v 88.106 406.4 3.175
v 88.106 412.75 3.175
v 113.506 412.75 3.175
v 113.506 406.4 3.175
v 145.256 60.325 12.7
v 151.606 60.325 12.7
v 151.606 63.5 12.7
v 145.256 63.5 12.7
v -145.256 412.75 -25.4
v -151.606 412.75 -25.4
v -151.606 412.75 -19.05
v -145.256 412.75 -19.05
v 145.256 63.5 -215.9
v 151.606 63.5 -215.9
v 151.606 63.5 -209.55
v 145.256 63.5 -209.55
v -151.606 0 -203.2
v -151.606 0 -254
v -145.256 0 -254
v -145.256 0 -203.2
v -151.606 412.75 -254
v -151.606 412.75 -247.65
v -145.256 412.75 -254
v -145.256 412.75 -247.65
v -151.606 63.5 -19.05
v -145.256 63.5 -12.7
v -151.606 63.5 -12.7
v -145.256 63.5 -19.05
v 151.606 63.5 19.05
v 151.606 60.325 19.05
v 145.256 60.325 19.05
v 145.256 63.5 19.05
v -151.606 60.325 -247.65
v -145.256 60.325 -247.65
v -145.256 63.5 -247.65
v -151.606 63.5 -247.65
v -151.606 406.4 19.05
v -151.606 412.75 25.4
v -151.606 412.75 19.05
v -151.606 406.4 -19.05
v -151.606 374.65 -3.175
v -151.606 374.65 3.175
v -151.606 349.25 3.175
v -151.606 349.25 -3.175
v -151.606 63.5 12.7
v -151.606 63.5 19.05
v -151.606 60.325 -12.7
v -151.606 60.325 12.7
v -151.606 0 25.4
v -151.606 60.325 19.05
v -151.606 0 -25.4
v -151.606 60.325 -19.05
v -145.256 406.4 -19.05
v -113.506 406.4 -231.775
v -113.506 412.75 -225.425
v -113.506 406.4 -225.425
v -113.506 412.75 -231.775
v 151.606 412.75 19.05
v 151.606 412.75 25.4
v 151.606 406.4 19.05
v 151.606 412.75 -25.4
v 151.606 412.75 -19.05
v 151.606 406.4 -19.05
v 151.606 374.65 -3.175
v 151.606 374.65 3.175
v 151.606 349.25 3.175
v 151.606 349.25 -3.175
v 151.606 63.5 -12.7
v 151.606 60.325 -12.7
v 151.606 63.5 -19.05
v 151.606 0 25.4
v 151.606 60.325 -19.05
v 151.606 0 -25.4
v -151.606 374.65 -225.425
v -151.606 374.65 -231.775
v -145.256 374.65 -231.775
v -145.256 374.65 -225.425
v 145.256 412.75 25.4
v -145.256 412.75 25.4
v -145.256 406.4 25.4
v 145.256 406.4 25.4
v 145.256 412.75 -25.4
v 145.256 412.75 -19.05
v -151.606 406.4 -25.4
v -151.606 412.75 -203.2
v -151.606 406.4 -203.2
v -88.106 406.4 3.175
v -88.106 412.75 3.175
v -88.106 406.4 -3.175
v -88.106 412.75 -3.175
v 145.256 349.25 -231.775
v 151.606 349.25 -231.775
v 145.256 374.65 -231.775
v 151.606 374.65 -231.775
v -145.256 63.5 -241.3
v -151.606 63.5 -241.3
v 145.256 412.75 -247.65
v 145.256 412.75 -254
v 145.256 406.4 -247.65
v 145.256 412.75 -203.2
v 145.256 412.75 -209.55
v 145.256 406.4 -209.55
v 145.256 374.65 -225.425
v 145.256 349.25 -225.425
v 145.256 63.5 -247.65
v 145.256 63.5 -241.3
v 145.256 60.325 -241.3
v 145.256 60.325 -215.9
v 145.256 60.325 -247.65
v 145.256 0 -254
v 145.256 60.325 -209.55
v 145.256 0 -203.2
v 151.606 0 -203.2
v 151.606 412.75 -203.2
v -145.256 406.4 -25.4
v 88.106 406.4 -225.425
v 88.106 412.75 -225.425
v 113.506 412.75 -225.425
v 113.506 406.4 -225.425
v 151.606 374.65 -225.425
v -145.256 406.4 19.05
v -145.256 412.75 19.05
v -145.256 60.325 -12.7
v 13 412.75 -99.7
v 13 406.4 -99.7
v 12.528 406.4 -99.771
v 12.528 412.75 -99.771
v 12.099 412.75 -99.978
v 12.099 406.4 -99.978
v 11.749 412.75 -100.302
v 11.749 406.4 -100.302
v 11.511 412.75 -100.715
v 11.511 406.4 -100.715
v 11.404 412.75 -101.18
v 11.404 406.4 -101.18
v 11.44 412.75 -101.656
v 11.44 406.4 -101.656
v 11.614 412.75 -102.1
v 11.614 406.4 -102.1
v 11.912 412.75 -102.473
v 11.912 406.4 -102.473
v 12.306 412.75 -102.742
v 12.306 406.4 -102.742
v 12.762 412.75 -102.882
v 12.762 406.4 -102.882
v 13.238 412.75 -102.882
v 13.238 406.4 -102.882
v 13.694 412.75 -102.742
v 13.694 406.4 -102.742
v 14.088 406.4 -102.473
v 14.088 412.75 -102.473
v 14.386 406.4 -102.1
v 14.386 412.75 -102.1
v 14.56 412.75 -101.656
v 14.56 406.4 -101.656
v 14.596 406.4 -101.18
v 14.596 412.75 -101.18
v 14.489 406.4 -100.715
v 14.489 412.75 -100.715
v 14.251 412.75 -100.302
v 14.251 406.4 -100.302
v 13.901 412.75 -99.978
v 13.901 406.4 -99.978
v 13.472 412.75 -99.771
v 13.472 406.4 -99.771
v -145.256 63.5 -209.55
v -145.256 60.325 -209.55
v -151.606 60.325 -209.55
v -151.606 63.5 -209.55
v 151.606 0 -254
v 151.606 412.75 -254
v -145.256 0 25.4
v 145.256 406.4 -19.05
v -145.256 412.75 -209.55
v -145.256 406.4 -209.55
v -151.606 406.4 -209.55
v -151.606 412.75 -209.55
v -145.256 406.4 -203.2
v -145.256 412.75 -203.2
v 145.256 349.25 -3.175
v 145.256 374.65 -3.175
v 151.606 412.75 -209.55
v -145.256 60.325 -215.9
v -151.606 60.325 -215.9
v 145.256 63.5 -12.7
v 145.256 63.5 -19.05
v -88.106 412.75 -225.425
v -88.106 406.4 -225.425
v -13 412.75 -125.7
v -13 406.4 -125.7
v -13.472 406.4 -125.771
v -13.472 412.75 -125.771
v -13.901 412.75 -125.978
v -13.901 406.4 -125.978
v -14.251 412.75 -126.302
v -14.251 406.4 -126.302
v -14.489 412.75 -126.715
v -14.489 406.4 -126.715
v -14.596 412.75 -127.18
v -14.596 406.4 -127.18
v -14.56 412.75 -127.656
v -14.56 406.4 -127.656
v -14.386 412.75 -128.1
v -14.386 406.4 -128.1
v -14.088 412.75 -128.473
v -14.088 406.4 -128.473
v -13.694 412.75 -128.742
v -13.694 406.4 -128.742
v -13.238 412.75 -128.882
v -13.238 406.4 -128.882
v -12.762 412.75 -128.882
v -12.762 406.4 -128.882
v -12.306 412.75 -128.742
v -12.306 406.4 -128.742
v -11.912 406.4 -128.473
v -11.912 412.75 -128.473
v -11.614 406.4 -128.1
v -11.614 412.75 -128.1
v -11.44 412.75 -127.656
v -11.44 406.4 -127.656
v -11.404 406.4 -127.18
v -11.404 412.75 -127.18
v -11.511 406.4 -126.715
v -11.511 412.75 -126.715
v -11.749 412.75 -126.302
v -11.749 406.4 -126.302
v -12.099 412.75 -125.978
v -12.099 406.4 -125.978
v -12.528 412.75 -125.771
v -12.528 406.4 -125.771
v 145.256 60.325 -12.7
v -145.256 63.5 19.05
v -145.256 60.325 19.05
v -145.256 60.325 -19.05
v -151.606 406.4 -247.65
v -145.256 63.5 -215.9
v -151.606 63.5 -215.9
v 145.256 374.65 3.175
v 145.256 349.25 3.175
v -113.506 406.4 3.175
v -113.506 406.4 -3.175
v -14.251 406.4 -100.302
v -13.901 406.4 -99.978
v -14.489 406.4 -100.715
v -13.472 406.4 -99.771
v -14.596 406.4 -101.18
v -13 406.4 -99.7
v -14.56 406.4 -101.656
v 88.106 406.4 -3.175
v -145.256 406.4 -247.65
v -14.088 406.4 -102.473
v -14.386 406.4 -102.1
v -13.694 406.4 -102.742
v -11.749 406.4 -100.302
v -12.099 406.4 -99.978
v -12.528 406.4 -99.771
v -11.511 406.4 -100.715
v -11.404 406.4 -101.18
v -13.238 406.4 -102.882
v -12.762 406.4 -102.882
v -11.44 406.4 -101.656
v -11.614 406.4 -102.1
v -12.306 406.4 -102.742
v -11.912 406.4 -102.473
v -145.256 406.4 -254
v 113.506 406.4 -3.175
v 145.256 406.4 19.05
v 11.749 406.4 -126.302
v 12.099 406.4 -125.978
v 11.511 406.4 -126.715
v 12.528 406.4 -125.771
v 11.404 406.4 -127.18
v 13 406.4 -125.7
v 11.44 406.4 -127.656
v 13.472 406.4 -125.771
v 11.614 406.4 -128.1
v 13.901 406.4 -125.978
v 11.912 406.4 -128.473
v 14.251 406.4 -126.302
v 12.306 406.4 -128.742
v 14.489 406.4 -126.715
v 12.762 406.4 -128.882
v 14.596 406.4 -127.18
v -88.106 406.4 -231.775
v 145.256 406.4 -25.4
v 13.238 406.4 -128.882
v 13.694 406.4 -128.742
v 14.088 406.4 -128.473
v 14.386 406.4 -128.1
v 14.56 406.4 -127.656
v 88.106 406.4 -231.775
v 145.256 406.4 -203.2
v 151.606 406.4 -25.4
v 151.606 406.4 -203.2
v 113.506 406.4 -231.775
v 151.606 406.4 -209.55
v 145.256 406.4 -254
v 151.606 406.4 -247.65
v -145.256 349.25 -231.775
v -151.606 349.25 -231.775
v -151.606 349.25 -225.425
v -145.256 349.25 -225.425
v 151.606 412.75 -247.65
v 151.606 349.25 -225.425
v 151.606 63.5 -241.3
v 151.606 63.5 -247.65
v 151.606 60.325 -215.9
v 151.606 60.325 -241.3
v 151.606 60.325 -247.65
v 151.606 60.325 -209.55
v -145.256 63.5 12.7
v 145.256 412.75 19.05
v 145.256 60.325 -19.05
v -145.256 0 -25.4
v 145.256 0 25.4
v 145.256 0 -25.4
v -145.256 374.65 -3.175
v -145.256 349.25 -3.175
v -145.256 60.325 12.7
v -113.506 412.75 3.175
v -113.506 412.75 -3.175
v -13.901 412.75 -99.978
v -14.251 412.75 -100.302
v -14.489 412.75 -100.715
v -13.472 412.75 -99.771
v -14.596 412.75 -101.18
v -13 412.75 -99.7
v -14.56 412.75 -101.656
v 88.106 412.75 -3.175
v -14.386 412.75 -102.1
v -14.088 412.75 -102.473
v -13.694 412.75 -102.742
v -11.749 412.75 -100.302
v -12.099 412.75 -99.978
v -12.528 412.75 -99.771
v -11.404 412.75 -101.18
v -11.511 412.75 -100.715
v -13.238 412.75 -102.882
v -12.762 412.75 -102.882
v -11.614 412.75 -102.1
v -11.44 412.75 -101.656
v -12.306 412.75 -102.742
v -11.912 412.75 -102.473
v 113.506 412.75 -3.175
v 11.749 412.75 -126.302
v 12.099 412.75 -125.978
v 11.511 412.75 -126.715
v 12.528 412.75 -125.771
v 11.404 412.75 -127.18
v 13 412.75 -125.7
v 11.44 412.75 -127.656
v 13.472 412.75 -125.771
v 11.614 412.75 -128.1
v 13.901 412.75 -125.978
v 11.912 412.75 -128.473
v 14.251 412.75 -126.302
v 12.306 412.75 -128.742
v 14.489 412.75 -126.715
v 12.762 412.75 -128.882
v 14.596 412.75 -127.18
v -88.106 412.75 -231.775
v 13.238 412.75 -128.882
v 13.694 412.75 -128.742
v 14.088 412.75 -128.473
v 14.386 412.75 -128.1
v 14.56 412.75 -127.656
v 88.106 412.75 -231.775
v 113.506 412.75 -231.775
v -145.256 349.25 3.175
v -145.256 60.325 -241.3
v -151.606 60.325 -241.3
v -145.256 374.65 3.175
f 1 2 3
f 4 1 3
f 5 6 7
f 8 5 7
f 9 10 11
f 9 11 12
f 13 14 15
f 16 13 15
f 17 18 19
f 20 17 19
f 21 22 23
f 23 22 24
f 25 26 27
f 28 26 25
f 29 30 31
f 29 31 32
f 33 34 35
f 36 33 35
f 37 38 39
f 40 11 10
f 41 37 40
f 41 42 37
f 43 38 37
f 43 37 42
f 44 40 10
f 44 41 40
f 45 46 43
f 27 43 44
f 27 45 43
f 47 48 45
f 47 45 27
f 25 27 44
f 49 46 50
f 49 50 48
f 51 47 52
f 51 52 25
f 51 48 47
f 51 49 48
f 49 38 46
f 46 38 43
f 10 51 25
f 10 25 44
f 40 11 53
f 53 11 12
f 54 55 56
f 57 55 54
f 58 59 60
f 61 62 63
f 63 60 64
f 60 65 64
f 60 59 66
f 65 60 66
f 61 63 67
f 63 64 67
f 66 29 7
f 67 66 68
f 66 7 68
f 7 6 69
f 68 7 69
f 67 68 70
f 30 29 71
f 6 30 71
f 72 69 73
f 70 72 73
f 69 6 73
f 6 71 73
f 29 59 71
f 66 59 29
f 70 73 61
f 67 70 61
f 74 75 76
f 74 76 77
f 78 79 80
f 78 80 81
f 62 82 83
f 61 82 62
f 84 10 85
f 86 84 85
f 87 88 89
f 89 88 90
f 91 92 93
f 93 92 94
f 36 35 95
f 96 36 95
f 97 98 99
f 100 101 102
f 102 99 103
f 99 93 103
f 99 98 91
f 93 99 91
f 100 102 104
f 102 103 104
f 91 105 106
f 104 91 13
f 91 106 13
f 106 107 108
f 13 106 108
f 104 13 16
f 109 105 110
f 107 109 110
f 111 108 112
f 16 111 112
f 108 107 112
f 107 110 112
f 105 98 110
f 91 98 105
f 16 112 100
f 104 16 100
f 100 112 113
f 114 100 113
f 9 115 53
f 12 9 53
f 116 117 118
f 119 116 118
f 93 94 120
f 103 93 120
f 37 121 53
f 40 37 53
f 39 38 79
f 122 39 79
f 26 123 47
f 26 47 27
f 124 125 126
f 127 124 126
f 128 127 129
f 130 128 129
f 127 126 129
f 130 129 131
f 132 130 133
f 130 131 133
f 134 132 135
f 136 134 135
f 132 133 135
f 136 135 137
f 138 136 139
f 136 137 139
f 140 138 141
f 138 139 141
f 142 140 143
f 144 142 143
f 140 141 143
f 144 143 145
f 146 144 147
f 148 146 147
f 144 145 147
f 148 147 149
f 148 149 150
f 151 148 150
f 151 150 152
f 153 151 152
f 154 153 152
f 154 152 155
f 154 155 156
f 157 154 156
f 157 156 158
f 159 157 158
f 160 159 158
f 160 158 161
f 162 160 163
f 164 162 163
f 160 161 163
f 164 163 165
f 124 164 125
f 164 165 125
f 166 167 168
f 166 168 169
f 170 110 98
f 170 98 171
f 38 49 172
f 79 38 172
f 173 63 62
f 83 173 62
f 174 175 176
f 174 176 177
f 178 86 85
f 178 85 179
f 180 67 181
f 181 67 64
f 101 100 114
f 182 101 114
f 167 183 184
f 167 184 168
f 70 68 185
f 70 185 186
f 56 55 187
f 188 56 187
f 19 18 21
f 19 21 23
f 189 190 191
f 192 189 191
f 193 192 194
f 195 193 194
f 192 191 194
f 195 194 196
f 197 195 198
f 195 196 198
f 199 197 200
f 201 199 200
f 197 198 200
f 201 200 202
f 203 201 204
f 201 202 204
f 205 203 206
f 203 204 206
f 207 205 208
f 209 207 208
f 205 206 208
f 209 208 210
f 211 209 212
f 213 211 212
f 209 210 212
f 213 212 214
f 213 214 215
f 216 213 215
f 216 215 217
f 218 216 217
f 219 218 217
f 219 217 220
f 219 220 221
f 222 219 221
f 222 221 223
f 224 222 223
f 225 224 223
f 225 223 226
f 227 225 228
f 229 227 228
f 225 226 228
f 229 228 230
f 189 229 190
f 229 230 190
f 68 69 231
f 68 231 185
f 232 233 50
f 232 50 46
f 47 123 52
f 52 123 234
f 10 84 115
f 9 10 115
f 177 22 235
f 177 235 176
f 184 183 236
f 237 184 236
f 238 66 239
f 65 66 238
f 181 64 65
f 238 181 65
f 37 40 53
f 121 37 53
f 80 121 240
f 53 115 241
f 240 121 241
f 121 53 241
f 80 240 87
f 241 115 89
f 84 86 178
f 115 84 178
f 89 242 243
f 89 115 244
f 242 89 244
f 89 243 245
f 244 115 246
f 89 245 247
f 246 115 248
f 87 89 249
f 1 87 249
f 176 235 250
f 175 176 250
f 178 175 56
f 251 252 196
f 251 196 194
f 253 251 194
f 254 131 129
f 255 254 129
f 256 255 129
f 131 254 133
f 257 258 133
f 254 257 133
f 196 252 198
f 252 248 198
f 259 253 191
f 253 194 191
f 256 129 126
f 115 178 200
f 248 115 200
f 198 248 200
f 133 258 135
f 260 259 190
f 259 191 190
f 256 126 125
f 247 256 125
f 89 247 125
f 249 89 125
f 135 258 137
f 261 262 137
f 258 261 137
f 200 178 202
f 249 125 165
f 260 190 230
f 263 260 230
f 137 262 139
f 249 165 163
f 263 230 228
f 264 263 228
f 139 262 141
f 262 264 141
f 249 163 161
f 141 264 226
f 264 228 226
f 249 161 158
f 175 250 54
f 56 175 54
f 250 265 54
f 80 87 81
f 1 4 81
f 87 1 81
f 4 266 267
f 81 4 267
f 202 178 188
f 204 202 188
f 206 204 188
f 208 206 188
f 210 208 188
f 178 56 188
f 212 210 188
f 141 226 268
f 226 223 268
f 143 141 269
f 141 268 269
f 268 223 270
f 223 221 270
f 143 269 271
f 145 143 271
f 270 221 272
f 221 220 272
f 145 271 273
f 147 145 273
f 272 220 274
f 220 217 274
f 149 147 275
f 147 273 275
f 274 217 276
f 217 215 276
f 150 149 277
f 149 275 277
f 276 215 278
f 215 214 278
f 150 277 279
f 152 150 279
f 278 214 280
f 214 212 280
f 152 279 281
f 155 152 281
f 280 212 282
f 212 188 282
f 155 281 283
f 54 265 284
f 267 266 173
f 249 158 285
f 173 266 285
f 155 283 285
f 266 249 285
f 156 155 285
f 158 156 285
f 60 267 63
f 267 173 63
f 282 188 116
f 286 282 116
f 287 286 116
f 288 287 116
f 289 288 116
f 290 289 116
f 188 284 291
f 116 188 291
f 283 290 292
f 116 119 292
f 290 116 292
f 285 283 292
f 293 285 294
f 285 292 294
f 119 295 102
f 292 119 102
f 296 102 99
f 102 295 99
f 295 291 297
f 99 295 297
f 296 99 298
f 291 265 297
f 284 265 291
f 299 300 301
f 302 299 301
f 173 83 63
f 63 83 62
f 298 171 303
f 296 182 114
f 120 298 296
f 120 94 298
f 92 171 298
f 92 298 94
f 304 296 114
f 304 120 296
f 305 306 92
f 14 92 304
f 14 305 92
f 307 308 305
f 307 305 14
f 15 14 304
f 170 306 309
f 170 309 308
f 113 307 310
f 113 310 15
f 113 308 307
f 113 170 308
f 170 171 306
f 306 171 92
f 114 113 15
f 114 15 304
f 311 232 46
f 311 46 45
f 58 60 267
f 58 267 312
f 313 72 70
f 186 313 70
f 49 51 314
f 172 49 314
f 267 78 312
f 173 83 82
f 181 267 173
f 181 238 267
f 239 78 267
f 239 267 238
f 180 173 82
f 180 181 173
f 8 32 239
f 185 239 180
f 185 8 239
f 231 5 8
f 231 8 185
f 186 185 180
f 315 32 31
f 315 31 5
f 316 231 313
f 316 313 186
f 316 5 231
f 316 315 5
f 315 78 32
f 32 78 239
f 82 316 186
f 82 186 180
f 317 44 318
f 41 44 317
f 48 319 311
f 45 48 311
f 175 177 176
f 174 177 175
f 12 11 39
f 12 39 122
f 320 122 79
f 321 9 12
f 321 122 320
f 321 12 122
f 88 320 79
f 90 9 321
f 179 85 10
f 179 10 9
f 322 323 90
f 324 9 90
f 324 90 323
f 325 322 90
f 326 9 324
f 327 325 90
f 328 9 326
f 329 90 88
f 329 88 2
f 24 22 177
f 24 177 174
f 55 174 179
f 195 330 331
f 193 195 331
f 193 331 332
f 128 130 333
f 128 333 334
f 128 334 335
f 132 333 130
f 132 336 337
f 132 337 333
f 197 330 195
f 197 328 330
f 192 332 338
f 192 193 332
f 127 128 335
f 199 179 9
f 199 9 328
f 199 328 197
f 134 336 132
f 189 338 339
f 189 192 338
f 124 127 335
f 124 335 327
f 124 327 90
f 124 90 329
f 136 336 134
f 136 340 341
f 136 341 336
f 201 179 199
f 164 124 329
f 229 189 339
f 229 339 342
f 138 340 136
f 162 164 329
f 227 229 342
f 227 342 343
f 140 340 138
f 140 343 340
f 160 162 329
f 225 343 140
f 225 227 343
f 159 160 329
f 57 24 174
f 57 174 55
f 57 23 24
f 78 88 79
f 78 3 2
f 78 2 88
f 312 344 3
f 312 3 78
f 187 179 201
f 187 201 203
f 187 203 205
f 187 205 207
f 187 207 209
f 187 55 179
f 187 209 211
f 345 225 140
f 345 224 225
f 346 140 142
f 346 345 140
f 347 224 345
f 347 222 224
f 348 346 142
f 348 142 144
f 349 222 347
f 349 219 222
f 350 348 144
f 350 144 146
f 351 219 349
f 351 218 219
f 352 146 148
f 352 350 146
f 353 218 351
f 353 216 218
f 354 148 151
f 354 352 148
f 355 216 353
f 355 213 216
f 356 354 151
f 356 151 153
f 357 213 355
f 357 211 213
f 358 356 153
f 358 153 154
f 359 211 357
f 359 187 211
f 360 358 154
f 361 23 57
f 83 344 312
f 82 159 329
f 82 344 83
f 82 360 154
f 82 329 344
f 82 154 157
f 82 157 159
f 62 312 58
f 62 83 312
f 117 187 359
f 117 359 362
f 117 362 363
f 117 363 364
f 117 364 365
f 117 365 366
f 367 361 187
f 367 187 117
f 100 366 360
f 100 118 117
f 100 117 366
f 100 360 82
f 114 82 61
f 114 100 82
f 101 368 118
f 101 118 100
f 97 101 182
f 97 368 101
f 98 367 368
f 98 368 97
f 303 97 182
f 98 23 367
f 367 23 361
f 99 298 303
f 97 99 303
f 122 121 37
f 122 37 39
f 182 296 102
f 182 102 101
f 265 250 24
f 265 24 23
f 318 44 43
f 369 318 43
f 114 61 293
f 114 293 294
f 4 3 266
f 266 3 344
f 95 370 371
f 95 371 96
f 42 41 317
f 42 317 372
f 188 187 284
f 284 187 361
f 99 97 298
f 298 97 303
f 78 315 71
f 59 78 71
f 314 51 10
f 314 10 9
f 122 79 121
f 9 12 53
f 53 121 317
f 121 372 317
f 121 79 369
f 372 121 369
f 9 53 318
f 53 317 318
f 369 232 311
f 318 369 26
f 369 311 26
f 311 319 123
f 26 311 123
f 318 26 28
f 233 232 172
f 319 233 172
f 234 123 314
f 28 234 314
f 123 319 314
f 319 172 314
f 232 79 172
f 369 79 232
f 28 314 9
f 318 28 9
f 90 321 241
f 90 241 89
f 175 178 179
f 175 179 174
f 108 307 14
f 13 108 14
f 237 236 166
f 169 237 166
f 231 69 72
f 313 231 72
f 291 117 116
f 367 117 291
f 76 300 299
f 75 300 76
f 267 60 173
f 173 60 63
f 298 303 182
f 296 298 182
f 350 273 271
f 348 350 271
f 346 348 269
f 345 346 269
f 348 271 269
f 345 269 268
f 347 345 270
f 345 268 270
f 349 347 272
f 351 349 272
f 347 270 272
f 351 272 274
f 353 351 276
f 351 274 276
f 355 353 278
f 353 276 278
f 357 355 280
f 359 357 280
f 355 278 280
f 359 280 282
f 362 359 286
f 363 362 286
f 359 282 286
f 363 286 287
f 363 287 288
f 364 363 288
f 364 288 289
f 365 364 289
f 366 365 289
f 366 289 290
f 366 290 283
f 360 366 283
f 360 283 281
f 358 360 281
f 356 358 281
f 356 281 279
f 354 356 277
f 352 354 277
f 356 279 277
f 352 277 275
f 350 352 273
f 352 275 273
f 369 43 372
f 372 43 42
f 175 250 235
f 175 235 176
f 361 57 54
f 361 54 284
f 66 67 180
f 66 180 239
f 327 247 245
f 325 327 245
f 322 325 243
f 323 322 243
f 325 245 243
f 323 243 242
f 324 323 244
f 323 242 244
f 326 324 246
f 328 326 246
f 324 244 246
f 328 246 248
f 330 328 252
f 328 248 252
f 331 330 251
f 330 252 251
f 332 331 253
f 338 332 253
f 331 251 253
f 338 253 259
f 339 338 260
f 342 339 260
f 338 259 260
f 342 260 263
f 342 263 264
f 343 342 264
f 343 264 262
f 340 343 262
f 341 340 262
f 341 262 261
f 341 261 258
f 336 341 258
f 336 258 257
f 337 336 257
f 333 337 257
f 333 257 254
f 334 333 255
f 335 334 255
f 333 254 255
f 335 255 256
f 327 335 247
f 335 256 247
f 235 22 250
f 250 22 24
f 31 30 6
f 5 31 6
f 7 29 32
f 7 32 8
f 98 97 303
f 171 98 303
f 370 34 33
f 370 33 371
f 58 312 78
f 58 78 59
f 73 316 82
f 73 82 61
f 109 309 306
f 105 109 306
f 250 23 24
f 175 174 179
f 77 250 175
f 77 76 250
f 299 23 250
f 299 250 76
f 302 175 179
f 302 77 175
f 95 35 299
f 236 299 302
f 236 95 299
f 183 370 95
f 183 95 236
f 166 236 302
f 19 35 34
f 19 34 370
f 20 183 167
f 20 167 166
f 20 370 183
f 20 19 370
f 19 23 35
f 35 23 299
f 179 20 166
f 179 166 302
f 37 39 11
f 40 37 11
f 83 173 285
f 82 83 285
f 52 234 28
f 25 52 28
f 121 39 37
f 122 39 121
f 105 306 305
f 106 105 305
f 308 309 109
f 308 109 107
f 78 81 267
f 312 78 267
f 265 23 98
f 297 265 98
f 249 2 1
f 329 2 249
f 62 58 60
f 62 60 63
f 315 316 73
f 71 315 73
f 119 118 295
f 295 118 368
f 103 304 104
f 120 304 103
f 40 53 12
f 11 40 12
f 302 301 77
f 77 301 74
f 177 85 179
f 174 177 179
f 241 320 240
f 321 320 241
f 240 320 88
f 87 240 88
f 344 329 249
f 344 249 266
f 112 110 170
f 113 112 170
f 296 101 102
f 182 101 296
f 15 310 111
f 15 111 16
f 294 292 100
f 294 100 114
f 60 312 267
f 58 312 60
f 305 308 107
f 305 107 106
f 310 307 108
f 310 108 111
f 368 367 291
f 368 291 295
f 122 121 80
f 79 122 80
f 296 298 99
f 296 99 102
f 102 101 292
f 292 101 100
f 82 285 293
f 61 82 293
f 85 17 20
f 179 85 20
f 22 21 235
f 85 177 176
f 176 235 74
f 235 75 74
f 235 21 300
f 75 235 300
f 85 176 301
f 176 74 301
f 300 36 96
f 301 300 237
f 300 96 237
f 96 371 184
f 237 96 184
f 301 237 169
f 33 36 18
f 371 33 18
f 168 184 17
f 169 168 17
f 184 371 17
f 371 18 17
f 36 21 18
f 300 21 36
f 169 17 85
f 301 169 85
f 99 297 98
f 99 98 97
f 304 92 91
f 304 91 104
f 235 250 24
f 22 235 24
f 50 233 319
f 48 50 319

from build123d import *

# Parameters (mm, degrees)
SKETCH1_W                     = 6.35
SKETCH1_H                     = 50.8
BOSS_EXTRUDE1_DEPTH           = 412.75
BOSS_EXTRUDE1_2_DEPTH         = 412.75
SKETCH3_W                     = 38.1
SKETCH3_H                     = 6.35
SKETCH3_W_2                   = 6.35
SKETCH3_H_2                   = 3.175
CUT_EXTRUDE1_DEPTH            = 513.782159066
SKETCH4_W                     = 6.35
SKETCH4_H                     = 38.1
BOSS_EXTRUDE2_DEPTH           = 6.35
SKETCH8_W                     = 303.2125
SKETCH8_H                     = 177.8
BOSS_EXTRUDE5_DEPTH           = 6.35
SKETCH11_W                    = 1.6
SKETCH11_H                    = 412.75
M3_CLEARANCE_HOLE1_AT_2_COUNT = 2
M3_CLEARANCE_HOLE1_AT_2_PITCH = 26
M3_CLEARANCE_HOLE1_AT_3_COUNT = 2
M3_CLEARANCE_HOLE1_AT_3_PITCH = 36.769552622
M3_CLEARANCE_HOLE1_AT_4_COUNT = 2
M3_CLEARANCE_HOLE1_AT_4_PITCH = 26
SKETCH12_W                    = 25.4
SKETCH12_H                    = 6.35
CUT_EXTRUDE2_DEPTH            = 6.35
SKETCH13_W                    = 6.35
SKETCH13_H                    = 25.4
CUT_EXTRUDE3_DEPTH            = 6.35


with BuildPart() as part:
    # Sketch1 → Boss-Extrude1 (new body)
    with BuildSketch(Plane(origin=(0, 0, 0), x_dir=(1, 0, 0), z_dir=(0, 1, 0))):
        with Locations((-148.43125, 0)):
            Rectangle(SKETCH1_W, SKETCH1_H)
    extrude(amount=BOSS_EXTRUDE1_DEPTH)


with BuildPart() as body_2:
    # Sketch1 → Boss-Extrude1 2 (new body)
    with BuildSketch(Plane(origin=(0, 0, 0), x_dir=(1, 0, 0), z_dir=(0, 1, 0))):
        with Locations((148.43125, 0)):
            Rectangle(SKETCH1_W, SKETCH1_H)
    extrude(amount=BOSS_EXTRUDE1_2_DEPTH)


with BuildPart() as cut_extrude1_tool:
    # Sketch3 → Cut-Extrude1 (new, through all)
    with BuildSketch(Plane(origin=(151.60625, 0, 0), x_dir=(0, 0, -1), z_dir=(1, 0, 0))):
        with Locations((0, 409.575)):
            Rectangle(SKETCH3_W, SKETCH3_H)
        with Locations((15.875, 61.9125)):
            Rectangle(SKETCH3_W_2, SKETCH3_H_2)
        with Locations((-15.875, 61.9125)):
            Rectangle(SKETCH3_W_2, SKETCH3_H_2)
    extrude(amount=-CUT_EXTRUDE1_DEPTH)


with BuildPart() as part_1:
    add(part.part)

    # Cut-Extrude1: cut by cut_extrude1_tool
    add(cut_extrude1_tool.part, mode=Mode.SUBTRACT)


with BuildPart() as body_2_1:
    add(body_2.part)

    # Cut-Extrude1: cut by cut_extrude1_tool
    add(cut_extrude1_tool.part, mode=Mode.SUBTRACT)


with BuildPart() as body_3:
    # Sketch4 → Boss-Extrude2 (new body)
    with BuildSketch(Plane(origin=(0, 412.75, 0), x_dir=(1, 0, 0), z_dir=(0, 1, 0))):
        with Locations((-148.43125, 0)):
            Rectangle(SKETCH4_W, SKETCH4_H)
        Polygon((-145.25625, 25.4), (-145.25625, 19.05), (-145.25625, -19.05), (-145.25625, -25.4), (145.25625, -25.4), (145.25625, -19.05), (145.25625, 19.05), (145.25625, 25.4), align=None)
        with Locations((148.43125, 0)):
            Rectangle(SKETCH4_W, SKETCH4_H)
    extrude(amount=-BOSS_EXTRUDE2_DEPTH)


with BuildPart() as body_4:
    # Mirror6: mirrored copy
    add(body_3.part.mirror(Plane(origin=(0, 0, -114.3), x_dir=(1, 0, 0), z_dir=(0, 0, -1))))


    add(body_3.part)  # Boss-Extrude5 merges body 3
    # Sketch8 → Boss-Extrude5 (add)
    with BuildSketch(Plane(origin=(0, 412.75, 0), x_dir=(1, 0, 0), z_dir=(0, 1, 0))):
        with Locations((0, 114.3)):
            Rectangle(SKETCH8_W, SKETCH8_H)
    extrude(amount=-BOSS_EXTRUDE5_DEPTH)

    # Sketch11 → M3 Clearance Hole1 (revolve, cut)
    with BuildSketch(Plane(origin=(-13, 412.75, -101.3), x_dir=(0, 0, 1), z_dir=(1, 0, 0))):
        with Locations((0.8, 206.375)):
            Rectangle(SKETCH11_W, SKETCH11_H)
    m3_clearance_hole1 = revolve(axis=Axis((-13, 419.1, -101.3), (0, -1, 0)), mode=Mode.SUBTRACT)

    # M3 Clearance Hole1 at 2: M3 Clearance Hole1 ×2
    with Locations(*[(0, 0, -i * M3_CLEARANCE_HOLE1_AT_2_PITCH) for i in range(1, M3_CLEARANCE_HOLE1_AT_2_COUNT)]):
        add(m3_clearance_hole1, mode=Mode.SUBTRACT)

    # M3 Clearance Hole1 at 3: M3 Clearance Hole1 ×2
    with Locations(*[Vector(0.7071067811865476, 0, -0.7071067811865476) * (i * M3_CLEARANCE_HOLE1_AT_3_PITCH) for i in range(1, M3_CLEARANCE_HOLE1_AT_3_COUNT)]):
        add(m3_clearance_hole1, mode=Mode.SUBTRACT)

    # M3 Clearance Hole1 at 4: M3 Clearance Hole1 ×2
    with Locations(*[(i * M3_CLEARANCE_HOLE1_AT_4_PITCH, 0, 0) for i in range(1, M3_CLEARANCE_HOLE1_AT_4_COUNT)]):
        add(m3_clearance_hole1, mode=Mode.SUBTRACT)

    # Sketch12 → Cut-Extrude2 (cut)
    with BuildSketch(Plane(origin=(0, 412.75, 0), x_dir=(1, 0, 0), z_dir=(0, 1, 0))):
        with Locations((-100.80625, 0)):
            Rectangle(SKETCH12_W, SKETCH12_H)
        with Locations((100.80625, 0)):
            Rectangle(SKETCH12_W, SKETCH12_H)
        with Locations((100.80625, 228.6)):
            Rectangle(SKETCH12_W, SKETCH12_H)
        with Locations((-100.80625, 228.6)):
            Rectangle(SKETCH12_W, SKETCH12_H)
    extrude(amount=-CUT_EXTRUDE2_DEPTH, mode=Mode.SUBTRACT)


with BuildPart() as body_5:
    # Mirror6 2: mirrored copy
    add(body_2_1.part.mirror(Plane(origin=(0, 0, -114.3), x_dir=(1, 0, 0), z_dir=(0, 0, -1))))


with BuildPart() as body_6:
    # Mirror6 3: mirrored copy
    add(part_1.part.mirror(Plane(origin=(0, 0, -114.3), x_dir=(1, 0, 0), z_dir=(0, 0, -1))))


with BuildPart() as cut_extrude3_tool:
    # Sketch13 → Cut-Extrude3 (new body)
    with BuildSketch(Plane.ZY.offset(151.60625)):
        with Locations((-228.6, 361.95)):
            Rectangle(SKETCH13_W, SKETCH13_H)
        with Locations((0, 361.95)):
            Rectangle(SKETCH13_W, SKETCH13_H)
    cut_extrude3 = extrude(amount=-CUT_EXTRUDE3_DEPTH)


with BuildPart() as part_2:
    add(part_1.part)

    # Cut-Extrude3: cut by cut_extrude3_tool
    add(cut_extrude3_tool.part, mode=Mode.SUBTRACT)


with BuildPart() as body_6_1:
    add(body_6.part)

    # Cut-Extrude3: cut by cut_extrude3_tool
    add(cut_extrude3_tool.part, mode=Mode.SUBTRACT)


with BuildPart() as mirror7_tool:
    # Mirror7: Cut-Extrude3 across plane
    add(cut_extrude3.mirror(Plane(origin=(0, 0, 0), x_dir=(0, 0, 1), z_dir=(1, 0, 0))))


with BuildPart() as body_2_2:
    add(body_2_1.part)

    # Mirror7: cut by mirror7_tool
    add(mirror7_tool.part, mode=Mode.SUBTRACT)


with BuildPart() as body_5_1:
    add(body_5.part)

    # Mirror7: cut by mirror7_tool
    add(mirror7_tool.part, mode=Mode.SUBTRACT)


solid = Compound([body_4.part, part_2.part, body_6_1.part, body_2_2.part, body_5_1.part])
